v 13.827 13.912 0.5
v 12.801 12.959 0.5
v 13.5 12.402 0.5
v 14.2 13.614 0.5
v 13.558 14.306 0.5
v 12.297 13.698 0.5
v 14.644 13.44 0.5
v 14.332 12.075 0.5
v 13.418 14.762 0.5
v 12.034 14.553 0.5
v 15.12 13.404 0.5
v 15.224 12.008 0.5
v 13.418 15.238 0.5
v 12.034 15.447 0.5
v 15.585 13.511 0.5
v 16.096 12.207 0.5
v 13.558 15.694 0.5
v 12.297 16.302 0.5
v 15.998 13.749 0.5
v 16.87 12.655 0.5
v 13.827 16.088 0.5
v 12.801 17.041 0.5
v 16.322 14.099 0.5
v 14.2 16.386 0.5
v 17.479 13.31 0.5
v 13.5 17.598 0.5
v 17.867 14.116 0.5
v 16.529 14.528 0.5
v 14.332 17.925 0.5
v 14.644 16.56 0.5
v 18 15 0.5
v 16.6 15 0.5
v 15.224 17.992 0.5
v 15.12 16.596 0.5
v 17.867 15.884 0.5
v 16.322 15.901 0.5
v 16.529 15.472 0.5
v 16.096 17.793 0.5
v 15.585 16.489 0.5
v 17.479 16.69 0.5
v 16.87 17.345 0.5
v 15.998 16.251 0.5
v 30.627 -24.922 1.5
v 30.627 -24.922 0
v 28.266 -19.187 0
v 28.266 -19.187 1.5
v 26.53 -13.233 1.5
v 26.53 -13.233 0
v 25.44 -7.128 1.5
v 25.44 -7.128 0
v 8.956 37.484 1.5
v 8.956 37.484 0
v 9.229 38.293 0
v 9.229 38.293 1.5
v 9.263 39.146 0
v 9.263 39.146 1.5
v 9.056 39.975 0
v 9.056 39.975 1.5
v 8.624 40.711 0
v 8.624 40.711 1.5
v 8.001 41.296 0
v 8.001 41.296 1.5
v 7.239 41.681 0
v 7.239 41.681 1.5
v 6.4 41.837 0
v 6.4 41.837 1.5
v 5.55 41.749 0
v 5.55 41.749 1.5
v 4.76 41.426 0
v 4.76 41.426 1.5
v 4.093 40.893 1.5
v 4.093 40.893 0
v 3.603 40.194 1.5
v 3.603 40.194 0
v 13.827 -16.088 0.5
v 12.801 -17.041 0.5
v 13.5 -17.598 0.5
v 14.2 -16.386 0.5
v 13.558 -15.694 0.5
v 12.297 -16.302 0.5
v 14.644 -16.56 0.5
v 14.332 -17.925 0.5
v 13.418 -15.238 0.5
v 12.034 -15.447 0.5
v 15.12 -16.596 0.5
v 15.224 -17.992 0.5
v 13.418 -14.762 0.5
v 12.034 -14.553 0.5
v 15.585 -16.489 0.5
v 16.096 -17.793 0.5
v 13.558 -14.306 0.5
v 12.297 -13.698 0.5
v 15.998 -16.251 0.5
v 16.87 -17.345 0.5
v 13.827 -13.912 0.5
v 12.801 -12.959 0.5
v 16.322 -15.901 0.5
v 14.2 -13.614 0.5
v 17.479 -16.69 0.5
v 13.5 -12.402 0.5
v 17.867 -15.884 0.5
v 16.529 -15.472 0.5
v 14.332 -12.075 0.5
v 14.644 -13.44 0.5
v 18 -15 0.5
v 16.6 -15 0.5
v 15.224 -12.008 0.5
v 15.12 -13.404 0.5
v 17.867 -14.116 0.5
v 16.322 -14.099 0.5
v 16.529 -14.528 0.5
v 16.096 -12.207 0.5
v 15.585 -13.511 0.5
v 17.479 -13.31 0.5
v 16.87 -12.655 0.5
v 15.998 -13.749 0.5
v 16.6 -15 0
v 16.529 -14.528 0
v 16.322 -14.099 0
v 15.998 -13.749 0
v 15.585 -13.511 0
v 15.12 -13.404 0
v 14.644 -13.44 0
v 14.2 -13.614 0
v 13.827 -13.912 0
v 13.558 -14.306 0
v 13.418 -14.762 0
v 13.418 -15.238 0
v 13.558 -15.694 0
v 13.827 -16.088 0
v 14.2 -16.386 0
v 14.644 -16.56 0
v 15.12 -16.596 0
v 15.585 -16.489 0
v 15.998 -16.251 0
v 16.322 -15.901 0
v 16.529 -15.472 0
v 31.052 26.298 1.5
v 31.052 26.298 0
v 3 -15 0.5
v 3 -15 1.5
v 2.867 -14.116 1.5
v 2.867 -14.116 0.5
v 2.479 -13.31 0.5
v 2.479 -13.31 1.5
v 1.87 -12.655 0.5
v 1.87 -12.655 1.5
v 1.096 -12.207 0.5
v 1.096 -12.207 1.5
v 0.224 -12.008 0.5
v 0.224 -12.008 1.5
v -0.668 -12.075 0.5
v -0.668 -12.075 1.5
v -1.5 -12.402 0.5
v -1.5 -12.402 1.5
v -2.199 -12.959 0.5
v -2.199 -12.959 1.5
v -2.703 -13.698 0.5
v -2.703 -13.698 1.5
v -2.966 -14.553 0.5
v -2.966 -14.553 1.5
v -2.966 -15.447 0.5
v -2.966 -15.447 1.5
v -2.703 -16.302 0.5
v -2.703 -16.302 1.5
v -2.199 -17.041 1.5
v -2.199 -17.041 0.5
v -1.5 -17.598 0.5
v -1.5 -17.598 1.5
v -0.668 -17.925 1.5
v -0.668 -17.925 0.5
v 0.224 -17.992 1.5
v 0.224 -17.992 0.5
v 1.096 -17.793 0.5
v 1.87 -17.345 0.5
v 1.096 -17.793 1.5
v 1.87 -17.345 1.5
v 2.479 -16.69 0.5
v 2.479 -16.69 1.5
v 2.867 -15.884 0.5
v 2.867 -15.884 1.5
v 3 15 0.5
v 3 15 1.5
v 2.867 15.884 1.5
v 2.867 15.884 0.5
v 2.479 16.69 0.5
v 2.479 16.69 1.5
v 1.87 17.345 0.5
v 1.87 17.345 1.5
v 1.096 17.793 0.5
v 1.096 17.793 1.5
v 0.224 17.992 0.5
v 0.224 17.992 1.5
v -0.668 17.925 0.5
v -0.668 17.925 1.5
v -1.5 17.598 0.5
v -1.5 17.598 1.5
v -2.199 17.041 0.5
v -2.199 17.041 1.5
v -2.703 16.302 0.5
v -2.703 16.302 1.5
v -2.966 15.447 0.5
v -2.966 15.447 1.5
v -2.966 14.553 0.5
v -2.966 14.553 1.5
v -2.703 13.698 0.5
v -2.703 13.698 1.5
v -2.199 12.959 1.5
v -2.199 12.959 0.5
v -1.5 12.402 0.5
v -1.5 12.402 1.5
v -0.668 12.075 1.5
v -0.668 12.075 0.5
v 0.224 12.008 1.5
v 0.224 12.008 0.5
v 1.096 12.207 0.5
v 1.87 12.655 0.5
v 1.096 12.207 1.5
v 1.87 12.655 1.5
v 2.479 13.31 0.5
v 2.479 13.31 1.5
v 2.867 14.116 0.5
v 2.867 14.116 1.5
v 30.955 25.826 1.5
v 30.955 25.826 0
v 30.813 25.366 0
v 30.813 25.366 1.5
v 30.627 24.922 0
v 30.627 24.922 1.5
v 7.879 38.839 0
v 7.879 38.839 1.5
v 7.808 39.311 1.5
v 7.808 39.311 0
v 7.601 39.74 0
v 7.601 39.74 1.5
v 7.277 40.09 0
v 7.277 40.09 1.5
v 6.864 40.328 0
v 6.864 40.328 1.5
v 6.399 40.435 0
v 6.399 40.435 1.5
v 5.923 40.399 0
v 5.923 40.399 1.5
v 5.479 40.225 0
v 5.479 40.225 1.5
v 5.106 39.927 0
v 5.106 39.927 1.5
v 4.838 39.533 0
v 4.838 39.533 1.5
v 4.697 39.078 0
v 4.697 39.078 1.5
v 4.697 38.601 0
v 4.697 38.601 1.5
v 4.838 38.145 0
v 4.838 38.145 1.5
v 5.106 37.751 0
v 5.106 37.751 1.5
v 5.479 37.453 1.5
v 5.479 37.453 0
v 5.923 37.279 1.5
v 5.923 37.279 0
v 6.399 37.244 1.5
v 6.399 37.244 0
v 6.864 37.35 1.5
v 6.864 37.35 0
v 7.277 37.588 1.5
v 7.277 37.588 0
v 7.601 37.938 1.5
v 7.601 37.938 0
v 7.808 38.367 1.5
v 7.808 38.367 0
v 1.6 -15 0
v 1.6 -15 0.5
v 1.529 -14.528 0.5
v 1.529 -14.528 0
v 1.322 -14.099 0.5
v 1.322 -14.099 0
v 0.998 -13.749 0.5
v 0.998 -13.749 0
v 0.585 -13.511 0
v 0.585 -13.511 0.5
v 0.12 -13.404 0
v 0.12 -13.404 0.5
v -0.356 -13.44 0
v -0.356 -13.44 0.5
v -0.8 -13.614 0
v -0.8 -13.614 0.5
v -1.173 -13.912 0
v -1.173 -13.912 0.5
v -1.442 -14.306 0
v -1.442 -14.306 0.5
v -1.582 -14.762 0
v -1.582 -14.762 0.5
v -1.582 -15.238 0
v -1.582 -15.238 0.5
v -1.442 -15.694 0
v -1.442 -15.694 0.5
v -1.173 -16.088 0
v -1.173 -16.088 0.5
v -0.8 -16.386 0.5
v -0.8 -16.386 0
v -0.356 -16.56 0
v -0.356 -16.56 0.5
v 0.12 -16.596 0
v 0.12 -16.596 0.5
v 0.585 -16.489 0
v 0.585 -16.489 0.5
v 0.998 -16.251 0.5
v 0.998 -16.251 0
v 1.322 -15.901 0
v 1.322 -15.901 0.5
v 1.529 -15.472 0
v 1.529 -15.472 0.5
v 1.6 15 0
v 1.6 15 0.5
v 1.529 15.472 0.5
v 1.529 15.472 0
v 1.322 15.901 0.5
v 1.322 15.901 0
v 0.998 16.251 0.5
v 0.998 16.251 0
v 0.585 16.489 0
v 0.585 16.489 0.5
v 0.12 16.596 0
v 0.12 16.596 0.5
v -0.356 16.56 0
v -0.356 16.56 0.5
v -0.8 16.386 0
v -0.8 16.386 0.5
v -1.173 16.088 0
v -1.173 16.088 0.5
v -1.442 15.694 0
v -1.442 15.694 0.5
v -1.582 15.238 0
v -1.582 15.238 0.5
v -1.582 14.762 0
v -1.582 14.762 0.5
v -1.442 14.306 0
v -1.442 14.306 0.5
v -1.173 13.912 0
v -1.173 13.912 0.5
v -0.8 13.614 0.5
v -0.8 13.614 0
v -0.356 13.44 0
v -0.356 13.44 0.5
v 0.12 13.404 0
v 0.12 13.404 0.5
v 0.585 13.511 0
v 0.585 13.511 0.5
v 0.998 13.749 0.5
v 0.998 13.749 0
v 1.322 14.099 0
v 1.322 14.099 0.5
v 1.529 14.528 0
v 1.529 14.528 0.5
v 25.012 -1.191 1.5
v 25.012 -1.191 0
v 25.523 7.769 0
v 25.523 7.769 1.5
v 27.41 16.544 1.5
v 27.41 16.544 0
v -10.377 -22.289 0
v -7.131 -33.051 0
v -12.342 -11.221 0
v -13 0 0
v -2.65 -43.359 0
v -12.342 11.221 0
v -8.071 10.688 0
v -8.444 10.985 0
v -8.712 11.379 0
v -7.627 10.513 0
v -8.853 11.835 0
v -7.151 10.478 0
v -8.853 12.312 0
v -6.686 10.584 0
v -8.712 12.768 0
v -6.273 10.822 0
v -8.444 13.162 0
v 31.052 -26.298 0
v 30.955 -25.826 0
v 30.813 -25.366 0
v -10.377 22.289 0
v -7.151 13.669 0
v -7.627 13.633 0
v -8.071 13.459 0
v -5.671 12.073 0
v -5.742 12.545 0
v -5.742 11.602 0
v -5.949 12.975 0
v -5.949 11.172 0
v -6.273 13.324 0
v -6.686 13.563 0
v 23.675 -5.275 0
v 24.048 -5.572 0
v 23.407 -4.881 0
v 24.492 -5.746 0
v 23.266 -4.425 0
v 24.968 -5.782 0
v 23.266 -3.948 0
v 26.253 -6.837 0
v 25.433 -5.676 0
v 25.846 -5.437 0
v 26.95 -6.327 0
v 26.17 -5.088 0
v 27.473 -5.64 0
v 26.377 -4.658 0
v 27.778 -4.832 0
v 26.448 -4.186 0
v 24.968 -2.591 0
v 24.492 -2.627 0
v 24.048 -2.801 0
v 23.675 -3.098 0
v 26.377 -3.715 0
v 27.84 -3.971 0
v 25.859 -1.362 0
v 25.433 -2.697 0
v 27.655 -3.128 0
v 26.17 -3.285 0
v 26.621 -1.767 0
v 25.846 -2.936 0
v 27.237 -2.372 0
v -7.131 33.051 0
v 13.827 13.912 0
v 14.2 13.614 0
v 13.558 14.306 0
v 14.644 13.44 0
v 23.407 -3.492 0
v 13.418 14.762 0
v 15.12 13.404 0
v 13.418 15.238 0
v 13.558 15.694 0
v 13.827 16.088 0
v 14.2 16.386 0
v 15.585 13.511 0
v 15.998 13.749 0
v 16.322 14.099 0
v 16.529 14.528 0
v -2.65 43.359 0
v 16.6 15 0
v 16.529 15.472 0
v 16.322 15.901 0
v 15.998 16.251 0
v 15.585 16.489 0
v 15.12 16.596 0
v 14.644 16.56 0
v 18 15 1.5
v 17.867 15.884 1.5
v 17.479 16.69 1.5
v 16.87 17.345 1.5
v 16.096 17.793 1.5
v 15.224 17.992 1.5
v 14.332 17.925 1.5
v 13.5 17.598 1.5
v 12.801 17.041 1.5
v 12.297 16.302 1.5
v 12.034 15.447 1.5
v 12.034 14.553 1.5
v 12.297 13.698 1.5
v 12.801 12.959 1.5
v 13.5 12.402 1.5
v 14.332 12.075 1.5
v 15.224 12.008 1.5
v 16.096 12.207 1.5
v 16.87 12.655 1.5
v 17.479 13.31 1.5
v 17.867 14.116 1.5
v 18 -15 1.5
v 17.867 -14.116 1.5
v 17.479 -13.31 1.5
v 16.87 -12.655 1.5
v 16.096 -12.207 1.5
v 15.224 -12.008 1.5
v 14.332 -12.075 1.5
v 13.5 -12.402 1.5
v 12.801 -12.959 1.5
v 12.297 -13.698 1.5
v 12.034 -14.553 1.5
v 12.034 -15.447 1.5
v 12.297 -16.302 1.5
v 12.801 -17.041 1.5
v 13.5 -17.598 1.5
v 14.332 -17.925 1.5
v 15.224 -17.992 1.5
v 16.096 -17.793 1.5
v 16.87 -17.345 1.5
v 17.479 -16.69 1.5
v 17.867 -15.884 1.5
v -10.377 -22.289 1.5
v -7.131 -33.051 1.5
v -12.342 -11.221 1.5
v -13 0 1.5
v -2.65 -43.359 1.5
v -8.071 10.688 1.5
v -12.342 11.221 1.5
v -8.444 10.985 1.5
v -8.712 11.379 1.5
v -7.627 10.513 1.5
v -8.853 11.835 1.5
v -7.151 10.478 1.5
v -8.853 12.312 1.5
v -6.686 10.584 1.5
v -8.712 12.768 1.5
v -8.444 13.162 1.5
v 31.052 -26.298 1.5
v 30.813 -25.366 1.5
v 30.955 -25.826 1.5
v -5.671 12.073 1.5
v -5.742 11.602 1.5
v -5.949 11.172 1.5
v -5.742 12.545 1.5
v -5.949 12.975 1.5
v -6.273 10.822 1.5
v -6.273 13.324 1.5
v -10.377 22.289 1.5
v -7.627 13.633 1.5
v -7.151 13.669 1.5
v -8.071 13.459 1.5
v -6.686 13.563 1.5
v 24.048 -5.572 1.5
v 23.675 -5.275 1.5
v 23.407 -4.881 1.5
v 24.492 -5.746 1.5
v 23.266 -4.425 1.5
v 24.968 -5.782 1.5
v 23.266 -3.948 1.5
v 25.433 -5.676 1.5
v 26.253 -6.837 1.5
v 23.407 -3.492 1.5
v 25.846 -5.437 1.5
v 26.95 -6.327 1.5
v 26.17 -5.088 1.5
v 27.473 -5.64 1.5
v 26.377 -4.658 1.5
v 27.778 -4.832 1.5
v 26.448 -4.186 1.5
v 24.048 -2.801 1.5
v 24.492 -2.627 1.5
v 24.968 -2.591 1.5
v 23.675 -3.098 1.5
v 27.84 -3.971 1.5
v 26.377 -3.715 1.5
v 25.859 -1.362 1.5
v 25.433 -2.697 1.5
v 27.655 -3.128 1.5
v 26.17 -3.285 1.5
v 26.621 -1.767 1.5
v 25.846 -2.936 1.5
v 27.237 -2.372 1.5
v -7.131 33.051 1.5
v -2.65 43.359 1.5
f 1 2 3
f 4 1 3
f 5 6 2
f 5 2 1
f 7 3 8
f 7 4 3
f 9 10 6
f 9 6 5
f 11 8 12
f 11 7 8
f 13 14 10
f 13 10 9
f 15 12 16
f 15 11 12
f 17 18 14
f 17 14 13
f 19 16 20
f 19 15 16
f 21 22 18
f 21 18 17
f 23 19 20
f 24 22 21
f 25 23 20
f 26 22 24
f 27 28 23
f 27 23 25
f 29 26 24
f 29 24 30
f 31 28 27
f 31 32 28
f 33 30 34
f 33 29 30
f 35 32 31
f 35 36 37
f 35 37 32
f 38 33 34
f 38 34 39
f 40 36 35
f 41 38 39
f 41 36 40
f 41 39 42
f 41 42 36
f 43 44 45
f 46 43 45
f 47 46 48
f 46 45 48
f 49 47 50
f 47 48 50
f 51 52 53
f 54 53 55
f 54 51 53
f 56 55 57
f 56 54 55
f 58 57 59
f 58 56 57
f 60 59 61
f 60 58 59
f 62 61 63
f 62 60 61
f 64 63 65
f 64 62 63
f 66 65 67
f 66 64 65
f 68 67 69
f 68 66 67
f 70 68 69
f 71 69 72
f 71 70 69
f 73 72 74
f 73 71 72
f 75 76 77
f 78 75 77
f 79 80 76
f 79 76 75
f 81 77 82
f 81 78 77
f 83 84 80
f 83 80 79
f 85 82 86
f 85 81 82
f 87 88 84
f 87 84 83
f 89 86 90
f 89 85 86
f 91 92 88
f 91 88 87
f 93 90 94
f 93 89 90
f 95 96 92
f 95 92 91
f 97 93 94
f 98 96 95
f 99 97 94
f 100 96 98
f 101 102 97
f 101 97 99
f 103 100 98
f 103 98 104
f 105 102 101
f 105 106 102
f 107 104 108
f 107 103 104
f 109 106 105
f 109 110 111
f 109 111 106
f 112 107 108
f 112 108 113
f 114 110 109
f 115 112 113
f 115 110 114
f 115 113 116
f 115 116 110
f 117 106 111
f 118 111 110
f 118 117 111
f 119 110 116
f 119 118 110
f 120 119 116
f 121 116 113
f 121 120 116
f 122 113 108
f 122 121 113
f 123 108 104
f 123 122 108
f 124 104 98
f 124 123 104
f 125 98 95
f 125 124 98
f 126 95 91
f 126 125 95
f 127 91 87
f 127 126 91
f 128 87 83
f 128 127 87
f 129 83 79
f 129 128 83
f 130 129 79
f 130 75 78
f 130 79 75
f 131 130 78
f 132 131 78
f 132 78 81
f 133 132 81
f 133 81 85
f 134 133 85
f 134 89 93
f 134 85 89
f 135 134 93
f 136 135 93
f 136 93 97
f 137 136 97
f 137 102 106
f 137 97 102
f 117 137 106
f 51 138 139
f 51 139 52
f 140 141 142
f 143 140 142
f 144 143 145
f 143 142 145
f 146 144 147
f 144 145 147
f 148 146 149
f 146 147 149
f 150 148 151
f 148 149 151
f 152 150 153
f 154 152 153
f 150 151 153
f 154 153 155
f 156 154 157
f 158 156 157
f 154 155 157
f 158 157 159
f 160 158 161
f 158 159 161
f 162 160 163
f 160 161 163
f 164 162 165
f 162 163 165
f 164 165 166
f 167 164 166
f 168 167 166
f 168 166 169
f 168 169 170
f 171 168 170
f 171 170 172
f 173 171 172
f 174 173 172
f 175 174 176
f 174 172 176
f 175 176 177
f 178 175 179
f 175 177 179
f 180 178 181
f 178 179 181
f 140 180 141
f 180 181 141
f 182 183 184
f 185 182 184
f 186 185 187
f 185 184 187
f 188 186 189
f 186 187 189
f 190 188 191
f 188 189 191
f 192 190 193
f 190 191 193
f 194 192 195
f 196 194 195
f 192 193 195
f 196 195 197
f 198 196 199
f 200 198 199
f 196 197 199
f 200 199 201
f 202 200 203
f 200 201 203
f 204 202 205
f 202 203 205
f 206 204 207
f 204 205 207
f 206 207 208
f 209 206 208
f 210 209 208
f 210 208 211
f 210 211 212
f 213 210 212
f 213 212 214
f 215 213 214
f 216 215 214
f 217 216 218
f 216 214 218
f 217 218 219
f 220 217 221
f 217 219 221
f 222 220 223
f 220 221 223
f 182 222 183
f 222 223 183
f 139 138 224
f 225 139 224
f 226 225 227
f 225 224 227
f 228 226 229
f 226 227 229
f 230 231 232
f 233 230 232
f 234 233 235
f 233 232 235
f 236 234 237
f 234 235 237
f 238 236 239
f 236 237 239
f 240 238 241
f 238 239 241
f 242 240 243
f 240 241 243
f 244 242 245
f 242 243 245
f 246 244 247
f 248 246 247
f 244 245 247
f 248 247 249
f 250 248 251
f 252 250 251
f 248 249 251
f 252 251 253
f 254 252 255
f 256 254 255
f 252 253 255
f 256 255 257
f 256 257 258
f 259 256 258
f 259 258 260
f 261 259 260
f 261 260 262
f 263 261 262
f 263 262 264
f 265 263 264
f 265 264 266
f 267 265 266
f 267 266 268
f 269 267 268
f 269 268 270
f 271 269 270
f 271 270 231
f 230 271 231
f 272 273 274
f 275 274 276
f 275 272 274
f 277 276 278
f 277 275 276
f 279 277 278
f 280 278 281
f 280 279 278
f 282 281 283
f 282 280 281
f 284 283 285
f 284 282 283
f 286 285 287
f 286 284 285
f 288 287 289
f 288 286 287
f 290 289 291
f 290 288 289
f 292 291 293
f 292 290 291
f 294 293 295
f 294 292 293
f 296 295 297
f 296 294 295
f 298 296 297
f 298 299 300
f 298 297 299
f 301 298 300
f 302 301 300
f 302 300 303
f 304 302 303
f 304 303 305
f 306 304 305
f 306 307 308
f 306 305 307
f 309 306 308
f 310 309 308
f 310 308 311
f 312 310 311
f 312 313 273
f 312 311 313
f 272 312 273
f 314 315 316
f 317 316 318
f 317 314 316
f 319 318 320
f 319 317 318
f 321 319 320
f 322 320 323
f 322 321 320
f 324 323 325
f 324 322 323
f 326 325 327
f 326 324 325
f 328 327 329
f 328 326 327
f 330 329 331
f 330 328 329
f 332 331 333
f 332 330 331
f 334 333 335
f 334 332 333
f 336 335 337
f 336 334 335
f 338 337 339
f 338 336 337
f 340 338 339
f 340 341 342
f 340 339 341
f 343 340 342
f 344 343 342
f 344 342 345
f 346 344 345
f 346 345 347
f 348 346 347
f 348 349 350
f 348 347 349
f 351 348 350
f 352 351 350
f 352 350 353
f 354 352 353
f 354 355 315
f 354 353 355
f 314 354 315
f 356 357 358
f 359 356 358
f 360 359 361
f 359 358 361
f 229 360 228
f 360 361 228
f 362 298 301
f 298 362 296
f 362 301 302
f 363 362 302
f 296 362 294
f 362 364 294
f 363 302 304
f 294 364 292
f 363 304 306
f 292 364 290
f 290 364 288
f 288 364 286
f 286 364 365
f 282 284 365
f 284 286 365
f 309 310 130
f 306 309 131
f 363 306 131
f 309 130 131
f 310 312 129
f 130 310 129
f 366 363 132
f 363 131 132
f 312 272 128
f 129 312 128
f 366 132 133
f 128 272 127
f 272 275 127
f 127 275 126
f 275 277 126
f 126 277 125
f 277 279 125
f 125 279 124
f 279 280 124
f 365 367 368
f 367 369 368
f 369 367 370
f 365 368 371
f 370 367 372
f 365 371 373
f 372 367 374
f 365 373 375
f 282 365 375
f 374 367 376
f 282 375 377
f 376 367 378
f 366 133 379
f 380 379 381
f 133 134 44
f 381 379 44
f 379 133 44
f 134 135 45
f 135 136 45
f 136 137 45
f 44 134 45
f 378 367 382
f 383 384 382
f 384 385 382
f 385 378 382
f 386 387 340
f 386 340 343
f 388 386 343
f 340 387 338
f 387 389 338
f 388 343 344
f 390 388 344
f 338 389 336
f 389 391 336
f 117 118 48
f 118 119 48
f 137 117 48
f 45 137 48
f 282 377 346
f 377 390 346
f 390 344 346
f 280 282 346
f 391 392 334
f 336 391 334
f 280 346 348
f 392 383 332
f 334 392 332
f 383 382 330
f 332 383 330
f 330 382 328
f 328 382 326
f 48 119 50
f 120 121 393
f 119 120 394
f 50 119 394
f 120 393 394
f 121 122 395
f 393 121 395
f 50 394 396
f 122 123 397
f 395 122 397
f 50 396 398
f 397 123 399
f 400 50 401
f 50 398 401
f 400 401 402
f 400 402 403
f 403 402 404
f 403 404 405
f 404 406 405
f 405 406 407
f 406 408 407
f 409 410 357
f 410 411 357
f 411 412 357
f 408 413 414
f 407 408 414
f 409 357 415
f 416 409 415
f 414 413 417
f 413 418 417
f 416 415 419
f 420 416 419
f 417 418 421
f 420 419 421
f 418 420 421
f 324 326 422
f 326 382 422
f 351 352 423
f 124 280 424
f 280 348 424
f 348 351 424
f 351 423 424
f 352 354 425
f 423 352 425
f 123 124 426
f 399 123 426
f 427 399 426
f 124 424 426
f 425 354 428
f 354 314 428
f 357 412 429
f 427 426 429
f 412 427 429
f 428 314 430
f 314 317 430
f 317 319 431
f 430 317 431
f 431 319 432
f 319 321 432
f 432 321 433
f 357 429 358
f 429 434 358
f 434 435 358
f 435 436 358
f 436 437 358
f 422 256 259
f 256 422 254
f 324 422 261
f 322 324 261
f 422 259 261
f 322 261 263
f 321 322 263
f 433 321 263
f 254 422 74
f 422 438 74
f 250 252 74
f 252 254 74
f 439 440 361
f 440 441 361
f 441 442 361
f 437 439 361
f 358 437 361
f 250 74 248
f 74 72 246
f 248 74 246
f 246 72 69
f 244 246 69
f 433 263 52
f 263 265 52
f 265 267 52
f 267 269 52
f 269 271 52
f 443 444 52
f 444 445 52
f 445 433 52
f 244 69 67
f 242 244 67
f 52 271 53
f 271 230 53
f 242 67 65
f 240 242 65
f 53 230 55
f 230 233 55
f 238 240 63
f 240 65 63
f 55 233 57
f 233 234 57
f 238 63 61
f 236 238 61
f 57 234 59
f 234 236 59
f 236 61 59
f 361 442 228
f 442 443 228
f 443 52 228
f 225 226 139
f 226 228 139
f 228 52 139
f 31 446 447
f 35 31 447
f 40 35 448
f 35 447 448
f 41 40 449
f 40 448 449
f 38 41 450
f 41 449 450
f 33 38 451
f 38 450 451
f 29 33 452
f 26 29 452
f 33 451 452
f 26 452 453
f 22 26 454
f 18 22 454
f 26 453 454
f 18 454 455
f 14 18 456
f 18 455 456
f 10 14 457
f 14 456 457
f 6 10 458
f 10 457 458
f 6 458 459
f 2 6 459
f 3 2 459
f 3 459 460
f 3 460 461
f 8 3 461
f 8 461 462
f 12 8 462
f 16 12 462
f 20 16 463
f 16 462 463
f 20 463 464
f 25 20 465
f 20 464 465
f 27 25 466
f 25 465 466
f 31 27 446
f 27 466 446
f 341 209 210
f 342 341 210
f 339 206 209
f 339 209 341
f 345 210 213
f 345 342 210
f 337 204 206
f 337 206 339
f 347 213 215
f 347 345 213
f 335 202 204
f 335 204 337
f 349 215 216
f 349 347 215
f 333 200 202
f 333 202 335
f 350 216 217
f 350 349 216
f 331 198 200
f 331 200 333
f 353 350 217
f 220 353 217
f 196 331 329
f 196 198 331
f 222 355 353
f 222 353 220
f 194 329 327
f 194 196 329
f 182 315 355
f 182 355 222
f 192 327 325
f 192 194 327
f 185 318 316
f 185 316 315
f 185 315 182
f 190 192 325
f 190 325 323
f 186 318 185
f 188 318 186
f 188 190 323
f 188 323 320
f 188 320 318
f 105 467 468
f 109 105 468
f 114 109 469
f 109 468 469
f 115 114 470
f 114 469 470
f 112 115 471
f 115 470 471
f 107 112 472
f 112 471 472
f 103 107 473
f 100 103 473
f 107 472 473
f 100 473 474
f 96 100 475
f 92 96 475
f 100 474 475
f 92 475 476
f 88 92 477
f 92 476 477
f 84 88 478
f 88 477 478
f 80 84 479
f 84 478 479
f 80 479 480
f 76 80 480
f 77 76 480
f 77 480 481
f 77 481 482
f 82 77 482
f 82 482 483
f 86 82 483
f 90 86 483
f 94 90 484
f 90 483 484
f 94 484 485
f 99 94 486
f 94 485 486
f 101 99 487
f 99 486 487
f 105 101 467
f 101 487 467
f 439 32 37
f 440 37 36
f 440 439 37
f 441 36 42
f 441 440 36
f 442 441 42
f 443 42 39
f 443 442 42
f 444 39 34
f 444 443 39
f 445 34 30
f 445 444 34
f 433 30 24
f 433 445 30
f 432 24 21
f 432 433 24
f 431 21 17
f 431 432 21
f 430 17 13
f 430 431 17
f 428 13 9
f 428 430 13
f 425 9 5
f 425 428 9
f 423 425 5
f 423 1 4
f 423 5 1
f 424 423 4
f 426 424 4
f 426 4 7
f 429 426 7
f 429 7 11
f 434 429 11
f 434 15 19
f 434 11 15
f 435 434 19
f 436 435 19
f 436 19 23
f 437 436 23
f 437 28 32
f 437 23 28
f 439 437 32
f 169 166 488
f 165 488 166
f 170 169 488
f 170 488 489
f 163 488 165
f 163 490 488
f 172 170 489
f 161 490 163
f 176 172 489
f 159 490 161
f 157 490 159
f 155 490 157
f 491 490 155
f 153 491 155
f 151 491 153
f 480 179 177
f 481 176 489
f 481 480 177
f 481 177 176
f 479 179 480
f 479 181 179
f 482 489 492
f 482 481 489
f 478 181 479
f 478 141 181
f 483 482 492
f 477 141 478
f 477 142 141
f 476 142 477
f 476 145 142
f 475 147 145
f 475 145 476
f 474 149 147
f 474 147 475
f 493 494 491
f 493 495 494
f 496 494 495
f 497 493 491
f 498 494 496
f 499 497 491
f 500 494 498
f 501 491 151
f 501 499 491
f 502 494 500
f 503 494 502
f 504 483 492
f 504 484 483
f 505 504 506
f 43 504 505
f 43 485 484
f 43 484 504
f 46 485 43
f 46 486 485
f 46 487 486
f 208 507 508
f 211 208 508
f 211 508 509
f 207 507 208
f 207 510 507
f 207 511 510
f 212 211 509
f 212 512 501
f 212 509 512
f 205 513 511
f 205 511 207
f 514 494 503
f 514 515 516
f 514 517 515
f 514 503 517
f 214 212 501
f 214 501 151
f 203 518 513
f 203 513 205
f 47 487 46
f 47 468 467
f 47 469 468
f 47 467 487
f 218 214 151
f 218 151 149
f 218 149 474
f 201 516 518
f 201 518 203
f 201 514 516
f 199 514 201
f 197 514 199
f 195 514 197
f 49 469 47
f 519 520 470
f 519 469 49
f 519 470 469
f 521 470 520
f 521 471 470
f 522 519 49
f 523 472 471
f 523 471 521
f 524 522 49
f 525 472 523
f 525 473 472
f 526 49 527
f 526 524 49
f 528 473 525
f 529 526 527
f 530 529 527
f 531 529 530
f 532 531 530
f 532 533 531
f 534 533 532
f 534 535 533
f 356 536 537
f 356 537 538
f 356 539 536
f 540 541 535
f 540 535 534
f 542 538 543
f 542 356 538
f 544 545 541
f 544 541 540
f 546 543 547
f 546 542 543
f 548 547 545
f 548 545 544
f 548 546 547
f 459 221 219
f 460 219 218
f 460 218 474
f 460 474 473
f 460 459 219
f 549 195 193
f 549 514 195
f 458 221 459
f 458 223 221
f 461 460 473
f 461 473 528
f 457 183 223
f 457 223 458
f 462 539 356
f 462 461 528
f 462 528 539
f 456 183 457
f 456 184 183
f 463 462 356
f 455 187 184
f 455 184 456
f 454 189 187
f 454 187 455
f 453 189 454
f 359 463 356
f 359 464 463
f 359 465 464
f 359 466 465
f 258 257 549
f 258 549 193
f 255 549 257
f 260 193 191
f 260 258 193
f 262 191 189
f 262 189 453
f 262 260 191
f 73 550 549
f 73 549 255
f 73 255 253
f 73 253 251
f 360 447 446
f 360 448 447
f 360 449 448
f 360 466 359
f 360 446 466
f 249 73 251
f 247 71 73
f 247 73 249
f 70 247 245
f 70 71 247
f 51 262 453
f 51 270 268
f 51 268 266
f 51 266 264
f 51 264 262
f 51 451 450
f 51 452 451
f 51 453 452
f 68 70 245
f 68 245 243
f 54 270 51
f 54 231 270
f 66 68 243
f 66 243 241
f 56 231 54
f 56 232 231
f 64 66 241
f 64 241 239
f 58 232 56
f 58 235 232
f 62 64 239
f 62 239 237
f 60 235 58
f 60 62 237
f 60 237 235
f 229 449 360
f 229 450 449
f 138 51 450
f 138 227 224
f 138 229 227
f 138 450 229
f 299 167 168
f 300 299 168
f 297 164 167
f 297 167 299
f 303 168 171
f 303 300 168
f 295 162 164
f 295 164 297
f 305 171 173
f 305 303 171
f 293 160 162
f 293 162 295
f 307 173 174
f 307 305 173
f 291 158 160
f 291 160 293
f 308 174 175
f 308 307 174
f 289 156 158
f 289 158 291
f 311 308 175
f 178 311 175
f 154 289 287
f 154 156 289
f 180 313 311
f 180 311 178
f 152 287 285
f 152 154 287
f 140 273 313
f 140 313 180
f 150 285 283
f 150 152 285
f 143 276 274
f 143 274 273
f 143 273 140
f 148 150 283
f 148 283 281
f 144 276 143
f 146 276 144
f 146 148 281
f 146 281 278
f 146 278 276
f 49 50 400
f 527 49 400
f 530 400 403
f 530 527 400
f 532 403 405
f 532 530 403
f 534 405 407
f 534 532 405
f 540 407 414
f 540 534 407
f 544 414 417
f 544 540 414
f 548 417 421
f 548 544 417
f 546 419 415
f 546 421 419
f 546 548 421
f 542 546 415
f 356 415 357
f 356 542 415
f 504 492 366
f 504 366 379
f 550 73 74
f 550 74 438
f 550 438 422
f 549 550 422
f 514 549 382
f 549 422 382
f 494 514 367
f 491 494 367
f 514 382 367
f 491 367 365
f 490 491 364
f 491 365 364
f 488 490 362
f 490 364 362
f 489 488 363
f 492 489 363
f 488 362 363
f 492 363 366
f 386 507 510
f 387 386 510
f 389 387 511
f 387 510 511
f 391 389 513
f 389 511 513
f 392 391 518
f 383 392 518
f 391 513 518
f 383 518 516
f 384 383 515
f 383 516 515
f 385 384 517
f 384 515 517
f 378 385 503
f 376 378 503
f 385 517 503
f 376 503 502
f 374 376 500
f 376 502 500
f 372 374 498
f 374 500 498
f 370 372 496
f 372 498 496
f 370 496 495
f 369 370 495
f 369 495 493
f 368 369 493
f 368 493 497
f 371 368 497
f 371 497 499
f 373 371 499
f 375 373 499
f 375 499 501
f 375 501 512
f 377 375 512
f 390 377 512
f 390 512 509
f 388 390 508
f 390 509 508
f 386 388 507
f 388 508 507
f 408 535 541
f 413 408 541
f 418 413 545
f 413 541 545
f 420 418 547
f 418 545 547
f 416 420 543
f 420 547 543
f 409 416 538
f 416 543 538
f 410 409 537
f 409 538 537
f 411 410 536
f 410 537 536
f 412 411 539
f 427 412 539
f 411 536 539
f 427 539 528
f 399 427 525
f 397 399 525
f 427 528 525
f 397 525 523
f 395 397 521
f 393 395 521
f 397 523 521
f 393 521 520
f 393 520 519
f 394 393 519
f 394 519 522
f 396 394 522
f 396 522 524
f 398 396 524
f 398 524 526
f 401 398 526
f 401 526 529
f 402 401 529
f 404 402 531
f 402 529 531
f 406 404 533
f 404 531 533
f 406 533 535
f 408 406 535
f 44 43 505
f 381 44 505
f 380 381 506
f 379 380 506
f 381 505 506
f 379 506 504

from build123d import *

# Parameters (mm, degrees)
SKETCH1_R           = 1.6
BOSS_EXTRUDE1_DEPTH = 1.5
FILLET1_R           = 5
CUT_EXTRUDE1_DEPTH  = 1.5
SKETCH3_R           = 1.6
CUT_EXTRUDE2_DEPTH  = 1.5
SKETCH4_R           = 3
SKETCH4_R_2         = 1.6
BOSS_EXTRUDE2_DEPTH = 1.5
SKETCH5_R           = 3
CUT_EXTRUDE3_DEPTH  = 1


with BuildPart() as part:
    # Sketch1 → Boss-Extrude1 (new body)
    with BuildSketch(Plane.XY):
        with BuildLine():
            Line((32.770526581, 29), (-0.138438763, 48))
            ThreePointArc((-0.138438763, 48), (-13, 0), (-0.138438763, -48))
            Line((-0.138438763, -48), (32.770526581, -29))
            ThreePointArc((32.770526581, -29), (25, 0), (32.770526581, 29))
        make_face()
        with Locations((0, 15)):
            Circle(SKETCH1_R, mode=Mode.SUBTRACT)
        with Locations((15, 15)):
            Circle(SKETCH1_R, mode=Mode.SUBTRACT)
        with Locations((15, -15)):
            Circle(SKETCH1_R, mode=Mode.SUBTRACT)
        with Locations((0, -15)):
            Circle(SKETCH1_R, mode=Mode.SUBTRACT)
    extrude(amount=BOSS_EXTRUDE1_DEPTH)

    # Fillet1
    fillet1_edges = [part.edges().sort_by_distance(p)[0] for p in [
        (32.770526581, -29, 0.75),
        (-0.138438763, -48, 0.75),
        (-0.138438763, 48, 0.75),
        (32.770526581, 29, 0.75),
    ]]
    fillet(fillet1_edges, radius=FILLET1_R)

    # Sketch2 → Cut-Extrude1 (cut)
    with BuildSketch(Plane.XY.offset(1.5)):
        Polygon((83, 0), (-2.650210769, 43.359444129), (-7.007085146, 61.211012317), (87.93666147, 66.514409607), (145.627275899, 17.878375919), (122.602770589, -61.543232286), (-16.449719346, -74.090294168), (-2.650210769, -43.359444129), align=None)
    extrude(amount=-CUT_EXTRUDE1_DEPTH, mode=Mode.SUBTRACT)

    # Sketch3 → Cut-Extrude2 (cut)
    with BuildSketch(Plane.XY.offset(1.5)):
        with Locations((6.279196304, 38.839033454)):
            Circle(SKETCH3_R)
        with Locations((-7.270629986, 12.073342588)):
            Circle(SKETCH3_R)
        with Locations((24.848199053, -4.18644896)):
            Circle(SKETCH3_R)
    extrude(amount=-CUT_EXTRUDE2_DEPTH, mode=Mode.SUBTRACT)

    # Sketch4 → Boss-Extrude2 (add)
    with BuildSketch(Plane.XY.offset(1.5)):
        with Locations((6.279196304, 38.839033454)):
            Circle(SKETCH4_R)
        with Locations((6.279196304, 38.839033454)):
            Circle(SKETCH4_R_2, mode=Mode.SUBTRACT)
        with Locations((24.848199053, -4.18644896)):
            Circle(SKETCH4_R)
        with Locations((24.848199053, -4.18644896)):
            Circle(SKETCH4_R_2, mode=Mode.SUBTRACT)
    extrude(amount=-BOSS_EXTRUDE2_DEPTH)

    # Sketch5 → Cut-Extrude3 (cut)
    with BuildSketch(Plane.XY.offset(1.5)):
        with Locations((0, 15)):
            Circle(SKETCH5_R)
        with Locations((15, 15)):
            Circle(SKETCH5_R)
        with Locations((15, -15)):
            Circle(SKETCH5_R)
        with Locations((0, -15)):
            Circle(SKETCH5_R)
    extrude(amount=-CUT_EXTRUDE3_DEPTH, mode=Mode.SUBTRACT)


solid = part.part
